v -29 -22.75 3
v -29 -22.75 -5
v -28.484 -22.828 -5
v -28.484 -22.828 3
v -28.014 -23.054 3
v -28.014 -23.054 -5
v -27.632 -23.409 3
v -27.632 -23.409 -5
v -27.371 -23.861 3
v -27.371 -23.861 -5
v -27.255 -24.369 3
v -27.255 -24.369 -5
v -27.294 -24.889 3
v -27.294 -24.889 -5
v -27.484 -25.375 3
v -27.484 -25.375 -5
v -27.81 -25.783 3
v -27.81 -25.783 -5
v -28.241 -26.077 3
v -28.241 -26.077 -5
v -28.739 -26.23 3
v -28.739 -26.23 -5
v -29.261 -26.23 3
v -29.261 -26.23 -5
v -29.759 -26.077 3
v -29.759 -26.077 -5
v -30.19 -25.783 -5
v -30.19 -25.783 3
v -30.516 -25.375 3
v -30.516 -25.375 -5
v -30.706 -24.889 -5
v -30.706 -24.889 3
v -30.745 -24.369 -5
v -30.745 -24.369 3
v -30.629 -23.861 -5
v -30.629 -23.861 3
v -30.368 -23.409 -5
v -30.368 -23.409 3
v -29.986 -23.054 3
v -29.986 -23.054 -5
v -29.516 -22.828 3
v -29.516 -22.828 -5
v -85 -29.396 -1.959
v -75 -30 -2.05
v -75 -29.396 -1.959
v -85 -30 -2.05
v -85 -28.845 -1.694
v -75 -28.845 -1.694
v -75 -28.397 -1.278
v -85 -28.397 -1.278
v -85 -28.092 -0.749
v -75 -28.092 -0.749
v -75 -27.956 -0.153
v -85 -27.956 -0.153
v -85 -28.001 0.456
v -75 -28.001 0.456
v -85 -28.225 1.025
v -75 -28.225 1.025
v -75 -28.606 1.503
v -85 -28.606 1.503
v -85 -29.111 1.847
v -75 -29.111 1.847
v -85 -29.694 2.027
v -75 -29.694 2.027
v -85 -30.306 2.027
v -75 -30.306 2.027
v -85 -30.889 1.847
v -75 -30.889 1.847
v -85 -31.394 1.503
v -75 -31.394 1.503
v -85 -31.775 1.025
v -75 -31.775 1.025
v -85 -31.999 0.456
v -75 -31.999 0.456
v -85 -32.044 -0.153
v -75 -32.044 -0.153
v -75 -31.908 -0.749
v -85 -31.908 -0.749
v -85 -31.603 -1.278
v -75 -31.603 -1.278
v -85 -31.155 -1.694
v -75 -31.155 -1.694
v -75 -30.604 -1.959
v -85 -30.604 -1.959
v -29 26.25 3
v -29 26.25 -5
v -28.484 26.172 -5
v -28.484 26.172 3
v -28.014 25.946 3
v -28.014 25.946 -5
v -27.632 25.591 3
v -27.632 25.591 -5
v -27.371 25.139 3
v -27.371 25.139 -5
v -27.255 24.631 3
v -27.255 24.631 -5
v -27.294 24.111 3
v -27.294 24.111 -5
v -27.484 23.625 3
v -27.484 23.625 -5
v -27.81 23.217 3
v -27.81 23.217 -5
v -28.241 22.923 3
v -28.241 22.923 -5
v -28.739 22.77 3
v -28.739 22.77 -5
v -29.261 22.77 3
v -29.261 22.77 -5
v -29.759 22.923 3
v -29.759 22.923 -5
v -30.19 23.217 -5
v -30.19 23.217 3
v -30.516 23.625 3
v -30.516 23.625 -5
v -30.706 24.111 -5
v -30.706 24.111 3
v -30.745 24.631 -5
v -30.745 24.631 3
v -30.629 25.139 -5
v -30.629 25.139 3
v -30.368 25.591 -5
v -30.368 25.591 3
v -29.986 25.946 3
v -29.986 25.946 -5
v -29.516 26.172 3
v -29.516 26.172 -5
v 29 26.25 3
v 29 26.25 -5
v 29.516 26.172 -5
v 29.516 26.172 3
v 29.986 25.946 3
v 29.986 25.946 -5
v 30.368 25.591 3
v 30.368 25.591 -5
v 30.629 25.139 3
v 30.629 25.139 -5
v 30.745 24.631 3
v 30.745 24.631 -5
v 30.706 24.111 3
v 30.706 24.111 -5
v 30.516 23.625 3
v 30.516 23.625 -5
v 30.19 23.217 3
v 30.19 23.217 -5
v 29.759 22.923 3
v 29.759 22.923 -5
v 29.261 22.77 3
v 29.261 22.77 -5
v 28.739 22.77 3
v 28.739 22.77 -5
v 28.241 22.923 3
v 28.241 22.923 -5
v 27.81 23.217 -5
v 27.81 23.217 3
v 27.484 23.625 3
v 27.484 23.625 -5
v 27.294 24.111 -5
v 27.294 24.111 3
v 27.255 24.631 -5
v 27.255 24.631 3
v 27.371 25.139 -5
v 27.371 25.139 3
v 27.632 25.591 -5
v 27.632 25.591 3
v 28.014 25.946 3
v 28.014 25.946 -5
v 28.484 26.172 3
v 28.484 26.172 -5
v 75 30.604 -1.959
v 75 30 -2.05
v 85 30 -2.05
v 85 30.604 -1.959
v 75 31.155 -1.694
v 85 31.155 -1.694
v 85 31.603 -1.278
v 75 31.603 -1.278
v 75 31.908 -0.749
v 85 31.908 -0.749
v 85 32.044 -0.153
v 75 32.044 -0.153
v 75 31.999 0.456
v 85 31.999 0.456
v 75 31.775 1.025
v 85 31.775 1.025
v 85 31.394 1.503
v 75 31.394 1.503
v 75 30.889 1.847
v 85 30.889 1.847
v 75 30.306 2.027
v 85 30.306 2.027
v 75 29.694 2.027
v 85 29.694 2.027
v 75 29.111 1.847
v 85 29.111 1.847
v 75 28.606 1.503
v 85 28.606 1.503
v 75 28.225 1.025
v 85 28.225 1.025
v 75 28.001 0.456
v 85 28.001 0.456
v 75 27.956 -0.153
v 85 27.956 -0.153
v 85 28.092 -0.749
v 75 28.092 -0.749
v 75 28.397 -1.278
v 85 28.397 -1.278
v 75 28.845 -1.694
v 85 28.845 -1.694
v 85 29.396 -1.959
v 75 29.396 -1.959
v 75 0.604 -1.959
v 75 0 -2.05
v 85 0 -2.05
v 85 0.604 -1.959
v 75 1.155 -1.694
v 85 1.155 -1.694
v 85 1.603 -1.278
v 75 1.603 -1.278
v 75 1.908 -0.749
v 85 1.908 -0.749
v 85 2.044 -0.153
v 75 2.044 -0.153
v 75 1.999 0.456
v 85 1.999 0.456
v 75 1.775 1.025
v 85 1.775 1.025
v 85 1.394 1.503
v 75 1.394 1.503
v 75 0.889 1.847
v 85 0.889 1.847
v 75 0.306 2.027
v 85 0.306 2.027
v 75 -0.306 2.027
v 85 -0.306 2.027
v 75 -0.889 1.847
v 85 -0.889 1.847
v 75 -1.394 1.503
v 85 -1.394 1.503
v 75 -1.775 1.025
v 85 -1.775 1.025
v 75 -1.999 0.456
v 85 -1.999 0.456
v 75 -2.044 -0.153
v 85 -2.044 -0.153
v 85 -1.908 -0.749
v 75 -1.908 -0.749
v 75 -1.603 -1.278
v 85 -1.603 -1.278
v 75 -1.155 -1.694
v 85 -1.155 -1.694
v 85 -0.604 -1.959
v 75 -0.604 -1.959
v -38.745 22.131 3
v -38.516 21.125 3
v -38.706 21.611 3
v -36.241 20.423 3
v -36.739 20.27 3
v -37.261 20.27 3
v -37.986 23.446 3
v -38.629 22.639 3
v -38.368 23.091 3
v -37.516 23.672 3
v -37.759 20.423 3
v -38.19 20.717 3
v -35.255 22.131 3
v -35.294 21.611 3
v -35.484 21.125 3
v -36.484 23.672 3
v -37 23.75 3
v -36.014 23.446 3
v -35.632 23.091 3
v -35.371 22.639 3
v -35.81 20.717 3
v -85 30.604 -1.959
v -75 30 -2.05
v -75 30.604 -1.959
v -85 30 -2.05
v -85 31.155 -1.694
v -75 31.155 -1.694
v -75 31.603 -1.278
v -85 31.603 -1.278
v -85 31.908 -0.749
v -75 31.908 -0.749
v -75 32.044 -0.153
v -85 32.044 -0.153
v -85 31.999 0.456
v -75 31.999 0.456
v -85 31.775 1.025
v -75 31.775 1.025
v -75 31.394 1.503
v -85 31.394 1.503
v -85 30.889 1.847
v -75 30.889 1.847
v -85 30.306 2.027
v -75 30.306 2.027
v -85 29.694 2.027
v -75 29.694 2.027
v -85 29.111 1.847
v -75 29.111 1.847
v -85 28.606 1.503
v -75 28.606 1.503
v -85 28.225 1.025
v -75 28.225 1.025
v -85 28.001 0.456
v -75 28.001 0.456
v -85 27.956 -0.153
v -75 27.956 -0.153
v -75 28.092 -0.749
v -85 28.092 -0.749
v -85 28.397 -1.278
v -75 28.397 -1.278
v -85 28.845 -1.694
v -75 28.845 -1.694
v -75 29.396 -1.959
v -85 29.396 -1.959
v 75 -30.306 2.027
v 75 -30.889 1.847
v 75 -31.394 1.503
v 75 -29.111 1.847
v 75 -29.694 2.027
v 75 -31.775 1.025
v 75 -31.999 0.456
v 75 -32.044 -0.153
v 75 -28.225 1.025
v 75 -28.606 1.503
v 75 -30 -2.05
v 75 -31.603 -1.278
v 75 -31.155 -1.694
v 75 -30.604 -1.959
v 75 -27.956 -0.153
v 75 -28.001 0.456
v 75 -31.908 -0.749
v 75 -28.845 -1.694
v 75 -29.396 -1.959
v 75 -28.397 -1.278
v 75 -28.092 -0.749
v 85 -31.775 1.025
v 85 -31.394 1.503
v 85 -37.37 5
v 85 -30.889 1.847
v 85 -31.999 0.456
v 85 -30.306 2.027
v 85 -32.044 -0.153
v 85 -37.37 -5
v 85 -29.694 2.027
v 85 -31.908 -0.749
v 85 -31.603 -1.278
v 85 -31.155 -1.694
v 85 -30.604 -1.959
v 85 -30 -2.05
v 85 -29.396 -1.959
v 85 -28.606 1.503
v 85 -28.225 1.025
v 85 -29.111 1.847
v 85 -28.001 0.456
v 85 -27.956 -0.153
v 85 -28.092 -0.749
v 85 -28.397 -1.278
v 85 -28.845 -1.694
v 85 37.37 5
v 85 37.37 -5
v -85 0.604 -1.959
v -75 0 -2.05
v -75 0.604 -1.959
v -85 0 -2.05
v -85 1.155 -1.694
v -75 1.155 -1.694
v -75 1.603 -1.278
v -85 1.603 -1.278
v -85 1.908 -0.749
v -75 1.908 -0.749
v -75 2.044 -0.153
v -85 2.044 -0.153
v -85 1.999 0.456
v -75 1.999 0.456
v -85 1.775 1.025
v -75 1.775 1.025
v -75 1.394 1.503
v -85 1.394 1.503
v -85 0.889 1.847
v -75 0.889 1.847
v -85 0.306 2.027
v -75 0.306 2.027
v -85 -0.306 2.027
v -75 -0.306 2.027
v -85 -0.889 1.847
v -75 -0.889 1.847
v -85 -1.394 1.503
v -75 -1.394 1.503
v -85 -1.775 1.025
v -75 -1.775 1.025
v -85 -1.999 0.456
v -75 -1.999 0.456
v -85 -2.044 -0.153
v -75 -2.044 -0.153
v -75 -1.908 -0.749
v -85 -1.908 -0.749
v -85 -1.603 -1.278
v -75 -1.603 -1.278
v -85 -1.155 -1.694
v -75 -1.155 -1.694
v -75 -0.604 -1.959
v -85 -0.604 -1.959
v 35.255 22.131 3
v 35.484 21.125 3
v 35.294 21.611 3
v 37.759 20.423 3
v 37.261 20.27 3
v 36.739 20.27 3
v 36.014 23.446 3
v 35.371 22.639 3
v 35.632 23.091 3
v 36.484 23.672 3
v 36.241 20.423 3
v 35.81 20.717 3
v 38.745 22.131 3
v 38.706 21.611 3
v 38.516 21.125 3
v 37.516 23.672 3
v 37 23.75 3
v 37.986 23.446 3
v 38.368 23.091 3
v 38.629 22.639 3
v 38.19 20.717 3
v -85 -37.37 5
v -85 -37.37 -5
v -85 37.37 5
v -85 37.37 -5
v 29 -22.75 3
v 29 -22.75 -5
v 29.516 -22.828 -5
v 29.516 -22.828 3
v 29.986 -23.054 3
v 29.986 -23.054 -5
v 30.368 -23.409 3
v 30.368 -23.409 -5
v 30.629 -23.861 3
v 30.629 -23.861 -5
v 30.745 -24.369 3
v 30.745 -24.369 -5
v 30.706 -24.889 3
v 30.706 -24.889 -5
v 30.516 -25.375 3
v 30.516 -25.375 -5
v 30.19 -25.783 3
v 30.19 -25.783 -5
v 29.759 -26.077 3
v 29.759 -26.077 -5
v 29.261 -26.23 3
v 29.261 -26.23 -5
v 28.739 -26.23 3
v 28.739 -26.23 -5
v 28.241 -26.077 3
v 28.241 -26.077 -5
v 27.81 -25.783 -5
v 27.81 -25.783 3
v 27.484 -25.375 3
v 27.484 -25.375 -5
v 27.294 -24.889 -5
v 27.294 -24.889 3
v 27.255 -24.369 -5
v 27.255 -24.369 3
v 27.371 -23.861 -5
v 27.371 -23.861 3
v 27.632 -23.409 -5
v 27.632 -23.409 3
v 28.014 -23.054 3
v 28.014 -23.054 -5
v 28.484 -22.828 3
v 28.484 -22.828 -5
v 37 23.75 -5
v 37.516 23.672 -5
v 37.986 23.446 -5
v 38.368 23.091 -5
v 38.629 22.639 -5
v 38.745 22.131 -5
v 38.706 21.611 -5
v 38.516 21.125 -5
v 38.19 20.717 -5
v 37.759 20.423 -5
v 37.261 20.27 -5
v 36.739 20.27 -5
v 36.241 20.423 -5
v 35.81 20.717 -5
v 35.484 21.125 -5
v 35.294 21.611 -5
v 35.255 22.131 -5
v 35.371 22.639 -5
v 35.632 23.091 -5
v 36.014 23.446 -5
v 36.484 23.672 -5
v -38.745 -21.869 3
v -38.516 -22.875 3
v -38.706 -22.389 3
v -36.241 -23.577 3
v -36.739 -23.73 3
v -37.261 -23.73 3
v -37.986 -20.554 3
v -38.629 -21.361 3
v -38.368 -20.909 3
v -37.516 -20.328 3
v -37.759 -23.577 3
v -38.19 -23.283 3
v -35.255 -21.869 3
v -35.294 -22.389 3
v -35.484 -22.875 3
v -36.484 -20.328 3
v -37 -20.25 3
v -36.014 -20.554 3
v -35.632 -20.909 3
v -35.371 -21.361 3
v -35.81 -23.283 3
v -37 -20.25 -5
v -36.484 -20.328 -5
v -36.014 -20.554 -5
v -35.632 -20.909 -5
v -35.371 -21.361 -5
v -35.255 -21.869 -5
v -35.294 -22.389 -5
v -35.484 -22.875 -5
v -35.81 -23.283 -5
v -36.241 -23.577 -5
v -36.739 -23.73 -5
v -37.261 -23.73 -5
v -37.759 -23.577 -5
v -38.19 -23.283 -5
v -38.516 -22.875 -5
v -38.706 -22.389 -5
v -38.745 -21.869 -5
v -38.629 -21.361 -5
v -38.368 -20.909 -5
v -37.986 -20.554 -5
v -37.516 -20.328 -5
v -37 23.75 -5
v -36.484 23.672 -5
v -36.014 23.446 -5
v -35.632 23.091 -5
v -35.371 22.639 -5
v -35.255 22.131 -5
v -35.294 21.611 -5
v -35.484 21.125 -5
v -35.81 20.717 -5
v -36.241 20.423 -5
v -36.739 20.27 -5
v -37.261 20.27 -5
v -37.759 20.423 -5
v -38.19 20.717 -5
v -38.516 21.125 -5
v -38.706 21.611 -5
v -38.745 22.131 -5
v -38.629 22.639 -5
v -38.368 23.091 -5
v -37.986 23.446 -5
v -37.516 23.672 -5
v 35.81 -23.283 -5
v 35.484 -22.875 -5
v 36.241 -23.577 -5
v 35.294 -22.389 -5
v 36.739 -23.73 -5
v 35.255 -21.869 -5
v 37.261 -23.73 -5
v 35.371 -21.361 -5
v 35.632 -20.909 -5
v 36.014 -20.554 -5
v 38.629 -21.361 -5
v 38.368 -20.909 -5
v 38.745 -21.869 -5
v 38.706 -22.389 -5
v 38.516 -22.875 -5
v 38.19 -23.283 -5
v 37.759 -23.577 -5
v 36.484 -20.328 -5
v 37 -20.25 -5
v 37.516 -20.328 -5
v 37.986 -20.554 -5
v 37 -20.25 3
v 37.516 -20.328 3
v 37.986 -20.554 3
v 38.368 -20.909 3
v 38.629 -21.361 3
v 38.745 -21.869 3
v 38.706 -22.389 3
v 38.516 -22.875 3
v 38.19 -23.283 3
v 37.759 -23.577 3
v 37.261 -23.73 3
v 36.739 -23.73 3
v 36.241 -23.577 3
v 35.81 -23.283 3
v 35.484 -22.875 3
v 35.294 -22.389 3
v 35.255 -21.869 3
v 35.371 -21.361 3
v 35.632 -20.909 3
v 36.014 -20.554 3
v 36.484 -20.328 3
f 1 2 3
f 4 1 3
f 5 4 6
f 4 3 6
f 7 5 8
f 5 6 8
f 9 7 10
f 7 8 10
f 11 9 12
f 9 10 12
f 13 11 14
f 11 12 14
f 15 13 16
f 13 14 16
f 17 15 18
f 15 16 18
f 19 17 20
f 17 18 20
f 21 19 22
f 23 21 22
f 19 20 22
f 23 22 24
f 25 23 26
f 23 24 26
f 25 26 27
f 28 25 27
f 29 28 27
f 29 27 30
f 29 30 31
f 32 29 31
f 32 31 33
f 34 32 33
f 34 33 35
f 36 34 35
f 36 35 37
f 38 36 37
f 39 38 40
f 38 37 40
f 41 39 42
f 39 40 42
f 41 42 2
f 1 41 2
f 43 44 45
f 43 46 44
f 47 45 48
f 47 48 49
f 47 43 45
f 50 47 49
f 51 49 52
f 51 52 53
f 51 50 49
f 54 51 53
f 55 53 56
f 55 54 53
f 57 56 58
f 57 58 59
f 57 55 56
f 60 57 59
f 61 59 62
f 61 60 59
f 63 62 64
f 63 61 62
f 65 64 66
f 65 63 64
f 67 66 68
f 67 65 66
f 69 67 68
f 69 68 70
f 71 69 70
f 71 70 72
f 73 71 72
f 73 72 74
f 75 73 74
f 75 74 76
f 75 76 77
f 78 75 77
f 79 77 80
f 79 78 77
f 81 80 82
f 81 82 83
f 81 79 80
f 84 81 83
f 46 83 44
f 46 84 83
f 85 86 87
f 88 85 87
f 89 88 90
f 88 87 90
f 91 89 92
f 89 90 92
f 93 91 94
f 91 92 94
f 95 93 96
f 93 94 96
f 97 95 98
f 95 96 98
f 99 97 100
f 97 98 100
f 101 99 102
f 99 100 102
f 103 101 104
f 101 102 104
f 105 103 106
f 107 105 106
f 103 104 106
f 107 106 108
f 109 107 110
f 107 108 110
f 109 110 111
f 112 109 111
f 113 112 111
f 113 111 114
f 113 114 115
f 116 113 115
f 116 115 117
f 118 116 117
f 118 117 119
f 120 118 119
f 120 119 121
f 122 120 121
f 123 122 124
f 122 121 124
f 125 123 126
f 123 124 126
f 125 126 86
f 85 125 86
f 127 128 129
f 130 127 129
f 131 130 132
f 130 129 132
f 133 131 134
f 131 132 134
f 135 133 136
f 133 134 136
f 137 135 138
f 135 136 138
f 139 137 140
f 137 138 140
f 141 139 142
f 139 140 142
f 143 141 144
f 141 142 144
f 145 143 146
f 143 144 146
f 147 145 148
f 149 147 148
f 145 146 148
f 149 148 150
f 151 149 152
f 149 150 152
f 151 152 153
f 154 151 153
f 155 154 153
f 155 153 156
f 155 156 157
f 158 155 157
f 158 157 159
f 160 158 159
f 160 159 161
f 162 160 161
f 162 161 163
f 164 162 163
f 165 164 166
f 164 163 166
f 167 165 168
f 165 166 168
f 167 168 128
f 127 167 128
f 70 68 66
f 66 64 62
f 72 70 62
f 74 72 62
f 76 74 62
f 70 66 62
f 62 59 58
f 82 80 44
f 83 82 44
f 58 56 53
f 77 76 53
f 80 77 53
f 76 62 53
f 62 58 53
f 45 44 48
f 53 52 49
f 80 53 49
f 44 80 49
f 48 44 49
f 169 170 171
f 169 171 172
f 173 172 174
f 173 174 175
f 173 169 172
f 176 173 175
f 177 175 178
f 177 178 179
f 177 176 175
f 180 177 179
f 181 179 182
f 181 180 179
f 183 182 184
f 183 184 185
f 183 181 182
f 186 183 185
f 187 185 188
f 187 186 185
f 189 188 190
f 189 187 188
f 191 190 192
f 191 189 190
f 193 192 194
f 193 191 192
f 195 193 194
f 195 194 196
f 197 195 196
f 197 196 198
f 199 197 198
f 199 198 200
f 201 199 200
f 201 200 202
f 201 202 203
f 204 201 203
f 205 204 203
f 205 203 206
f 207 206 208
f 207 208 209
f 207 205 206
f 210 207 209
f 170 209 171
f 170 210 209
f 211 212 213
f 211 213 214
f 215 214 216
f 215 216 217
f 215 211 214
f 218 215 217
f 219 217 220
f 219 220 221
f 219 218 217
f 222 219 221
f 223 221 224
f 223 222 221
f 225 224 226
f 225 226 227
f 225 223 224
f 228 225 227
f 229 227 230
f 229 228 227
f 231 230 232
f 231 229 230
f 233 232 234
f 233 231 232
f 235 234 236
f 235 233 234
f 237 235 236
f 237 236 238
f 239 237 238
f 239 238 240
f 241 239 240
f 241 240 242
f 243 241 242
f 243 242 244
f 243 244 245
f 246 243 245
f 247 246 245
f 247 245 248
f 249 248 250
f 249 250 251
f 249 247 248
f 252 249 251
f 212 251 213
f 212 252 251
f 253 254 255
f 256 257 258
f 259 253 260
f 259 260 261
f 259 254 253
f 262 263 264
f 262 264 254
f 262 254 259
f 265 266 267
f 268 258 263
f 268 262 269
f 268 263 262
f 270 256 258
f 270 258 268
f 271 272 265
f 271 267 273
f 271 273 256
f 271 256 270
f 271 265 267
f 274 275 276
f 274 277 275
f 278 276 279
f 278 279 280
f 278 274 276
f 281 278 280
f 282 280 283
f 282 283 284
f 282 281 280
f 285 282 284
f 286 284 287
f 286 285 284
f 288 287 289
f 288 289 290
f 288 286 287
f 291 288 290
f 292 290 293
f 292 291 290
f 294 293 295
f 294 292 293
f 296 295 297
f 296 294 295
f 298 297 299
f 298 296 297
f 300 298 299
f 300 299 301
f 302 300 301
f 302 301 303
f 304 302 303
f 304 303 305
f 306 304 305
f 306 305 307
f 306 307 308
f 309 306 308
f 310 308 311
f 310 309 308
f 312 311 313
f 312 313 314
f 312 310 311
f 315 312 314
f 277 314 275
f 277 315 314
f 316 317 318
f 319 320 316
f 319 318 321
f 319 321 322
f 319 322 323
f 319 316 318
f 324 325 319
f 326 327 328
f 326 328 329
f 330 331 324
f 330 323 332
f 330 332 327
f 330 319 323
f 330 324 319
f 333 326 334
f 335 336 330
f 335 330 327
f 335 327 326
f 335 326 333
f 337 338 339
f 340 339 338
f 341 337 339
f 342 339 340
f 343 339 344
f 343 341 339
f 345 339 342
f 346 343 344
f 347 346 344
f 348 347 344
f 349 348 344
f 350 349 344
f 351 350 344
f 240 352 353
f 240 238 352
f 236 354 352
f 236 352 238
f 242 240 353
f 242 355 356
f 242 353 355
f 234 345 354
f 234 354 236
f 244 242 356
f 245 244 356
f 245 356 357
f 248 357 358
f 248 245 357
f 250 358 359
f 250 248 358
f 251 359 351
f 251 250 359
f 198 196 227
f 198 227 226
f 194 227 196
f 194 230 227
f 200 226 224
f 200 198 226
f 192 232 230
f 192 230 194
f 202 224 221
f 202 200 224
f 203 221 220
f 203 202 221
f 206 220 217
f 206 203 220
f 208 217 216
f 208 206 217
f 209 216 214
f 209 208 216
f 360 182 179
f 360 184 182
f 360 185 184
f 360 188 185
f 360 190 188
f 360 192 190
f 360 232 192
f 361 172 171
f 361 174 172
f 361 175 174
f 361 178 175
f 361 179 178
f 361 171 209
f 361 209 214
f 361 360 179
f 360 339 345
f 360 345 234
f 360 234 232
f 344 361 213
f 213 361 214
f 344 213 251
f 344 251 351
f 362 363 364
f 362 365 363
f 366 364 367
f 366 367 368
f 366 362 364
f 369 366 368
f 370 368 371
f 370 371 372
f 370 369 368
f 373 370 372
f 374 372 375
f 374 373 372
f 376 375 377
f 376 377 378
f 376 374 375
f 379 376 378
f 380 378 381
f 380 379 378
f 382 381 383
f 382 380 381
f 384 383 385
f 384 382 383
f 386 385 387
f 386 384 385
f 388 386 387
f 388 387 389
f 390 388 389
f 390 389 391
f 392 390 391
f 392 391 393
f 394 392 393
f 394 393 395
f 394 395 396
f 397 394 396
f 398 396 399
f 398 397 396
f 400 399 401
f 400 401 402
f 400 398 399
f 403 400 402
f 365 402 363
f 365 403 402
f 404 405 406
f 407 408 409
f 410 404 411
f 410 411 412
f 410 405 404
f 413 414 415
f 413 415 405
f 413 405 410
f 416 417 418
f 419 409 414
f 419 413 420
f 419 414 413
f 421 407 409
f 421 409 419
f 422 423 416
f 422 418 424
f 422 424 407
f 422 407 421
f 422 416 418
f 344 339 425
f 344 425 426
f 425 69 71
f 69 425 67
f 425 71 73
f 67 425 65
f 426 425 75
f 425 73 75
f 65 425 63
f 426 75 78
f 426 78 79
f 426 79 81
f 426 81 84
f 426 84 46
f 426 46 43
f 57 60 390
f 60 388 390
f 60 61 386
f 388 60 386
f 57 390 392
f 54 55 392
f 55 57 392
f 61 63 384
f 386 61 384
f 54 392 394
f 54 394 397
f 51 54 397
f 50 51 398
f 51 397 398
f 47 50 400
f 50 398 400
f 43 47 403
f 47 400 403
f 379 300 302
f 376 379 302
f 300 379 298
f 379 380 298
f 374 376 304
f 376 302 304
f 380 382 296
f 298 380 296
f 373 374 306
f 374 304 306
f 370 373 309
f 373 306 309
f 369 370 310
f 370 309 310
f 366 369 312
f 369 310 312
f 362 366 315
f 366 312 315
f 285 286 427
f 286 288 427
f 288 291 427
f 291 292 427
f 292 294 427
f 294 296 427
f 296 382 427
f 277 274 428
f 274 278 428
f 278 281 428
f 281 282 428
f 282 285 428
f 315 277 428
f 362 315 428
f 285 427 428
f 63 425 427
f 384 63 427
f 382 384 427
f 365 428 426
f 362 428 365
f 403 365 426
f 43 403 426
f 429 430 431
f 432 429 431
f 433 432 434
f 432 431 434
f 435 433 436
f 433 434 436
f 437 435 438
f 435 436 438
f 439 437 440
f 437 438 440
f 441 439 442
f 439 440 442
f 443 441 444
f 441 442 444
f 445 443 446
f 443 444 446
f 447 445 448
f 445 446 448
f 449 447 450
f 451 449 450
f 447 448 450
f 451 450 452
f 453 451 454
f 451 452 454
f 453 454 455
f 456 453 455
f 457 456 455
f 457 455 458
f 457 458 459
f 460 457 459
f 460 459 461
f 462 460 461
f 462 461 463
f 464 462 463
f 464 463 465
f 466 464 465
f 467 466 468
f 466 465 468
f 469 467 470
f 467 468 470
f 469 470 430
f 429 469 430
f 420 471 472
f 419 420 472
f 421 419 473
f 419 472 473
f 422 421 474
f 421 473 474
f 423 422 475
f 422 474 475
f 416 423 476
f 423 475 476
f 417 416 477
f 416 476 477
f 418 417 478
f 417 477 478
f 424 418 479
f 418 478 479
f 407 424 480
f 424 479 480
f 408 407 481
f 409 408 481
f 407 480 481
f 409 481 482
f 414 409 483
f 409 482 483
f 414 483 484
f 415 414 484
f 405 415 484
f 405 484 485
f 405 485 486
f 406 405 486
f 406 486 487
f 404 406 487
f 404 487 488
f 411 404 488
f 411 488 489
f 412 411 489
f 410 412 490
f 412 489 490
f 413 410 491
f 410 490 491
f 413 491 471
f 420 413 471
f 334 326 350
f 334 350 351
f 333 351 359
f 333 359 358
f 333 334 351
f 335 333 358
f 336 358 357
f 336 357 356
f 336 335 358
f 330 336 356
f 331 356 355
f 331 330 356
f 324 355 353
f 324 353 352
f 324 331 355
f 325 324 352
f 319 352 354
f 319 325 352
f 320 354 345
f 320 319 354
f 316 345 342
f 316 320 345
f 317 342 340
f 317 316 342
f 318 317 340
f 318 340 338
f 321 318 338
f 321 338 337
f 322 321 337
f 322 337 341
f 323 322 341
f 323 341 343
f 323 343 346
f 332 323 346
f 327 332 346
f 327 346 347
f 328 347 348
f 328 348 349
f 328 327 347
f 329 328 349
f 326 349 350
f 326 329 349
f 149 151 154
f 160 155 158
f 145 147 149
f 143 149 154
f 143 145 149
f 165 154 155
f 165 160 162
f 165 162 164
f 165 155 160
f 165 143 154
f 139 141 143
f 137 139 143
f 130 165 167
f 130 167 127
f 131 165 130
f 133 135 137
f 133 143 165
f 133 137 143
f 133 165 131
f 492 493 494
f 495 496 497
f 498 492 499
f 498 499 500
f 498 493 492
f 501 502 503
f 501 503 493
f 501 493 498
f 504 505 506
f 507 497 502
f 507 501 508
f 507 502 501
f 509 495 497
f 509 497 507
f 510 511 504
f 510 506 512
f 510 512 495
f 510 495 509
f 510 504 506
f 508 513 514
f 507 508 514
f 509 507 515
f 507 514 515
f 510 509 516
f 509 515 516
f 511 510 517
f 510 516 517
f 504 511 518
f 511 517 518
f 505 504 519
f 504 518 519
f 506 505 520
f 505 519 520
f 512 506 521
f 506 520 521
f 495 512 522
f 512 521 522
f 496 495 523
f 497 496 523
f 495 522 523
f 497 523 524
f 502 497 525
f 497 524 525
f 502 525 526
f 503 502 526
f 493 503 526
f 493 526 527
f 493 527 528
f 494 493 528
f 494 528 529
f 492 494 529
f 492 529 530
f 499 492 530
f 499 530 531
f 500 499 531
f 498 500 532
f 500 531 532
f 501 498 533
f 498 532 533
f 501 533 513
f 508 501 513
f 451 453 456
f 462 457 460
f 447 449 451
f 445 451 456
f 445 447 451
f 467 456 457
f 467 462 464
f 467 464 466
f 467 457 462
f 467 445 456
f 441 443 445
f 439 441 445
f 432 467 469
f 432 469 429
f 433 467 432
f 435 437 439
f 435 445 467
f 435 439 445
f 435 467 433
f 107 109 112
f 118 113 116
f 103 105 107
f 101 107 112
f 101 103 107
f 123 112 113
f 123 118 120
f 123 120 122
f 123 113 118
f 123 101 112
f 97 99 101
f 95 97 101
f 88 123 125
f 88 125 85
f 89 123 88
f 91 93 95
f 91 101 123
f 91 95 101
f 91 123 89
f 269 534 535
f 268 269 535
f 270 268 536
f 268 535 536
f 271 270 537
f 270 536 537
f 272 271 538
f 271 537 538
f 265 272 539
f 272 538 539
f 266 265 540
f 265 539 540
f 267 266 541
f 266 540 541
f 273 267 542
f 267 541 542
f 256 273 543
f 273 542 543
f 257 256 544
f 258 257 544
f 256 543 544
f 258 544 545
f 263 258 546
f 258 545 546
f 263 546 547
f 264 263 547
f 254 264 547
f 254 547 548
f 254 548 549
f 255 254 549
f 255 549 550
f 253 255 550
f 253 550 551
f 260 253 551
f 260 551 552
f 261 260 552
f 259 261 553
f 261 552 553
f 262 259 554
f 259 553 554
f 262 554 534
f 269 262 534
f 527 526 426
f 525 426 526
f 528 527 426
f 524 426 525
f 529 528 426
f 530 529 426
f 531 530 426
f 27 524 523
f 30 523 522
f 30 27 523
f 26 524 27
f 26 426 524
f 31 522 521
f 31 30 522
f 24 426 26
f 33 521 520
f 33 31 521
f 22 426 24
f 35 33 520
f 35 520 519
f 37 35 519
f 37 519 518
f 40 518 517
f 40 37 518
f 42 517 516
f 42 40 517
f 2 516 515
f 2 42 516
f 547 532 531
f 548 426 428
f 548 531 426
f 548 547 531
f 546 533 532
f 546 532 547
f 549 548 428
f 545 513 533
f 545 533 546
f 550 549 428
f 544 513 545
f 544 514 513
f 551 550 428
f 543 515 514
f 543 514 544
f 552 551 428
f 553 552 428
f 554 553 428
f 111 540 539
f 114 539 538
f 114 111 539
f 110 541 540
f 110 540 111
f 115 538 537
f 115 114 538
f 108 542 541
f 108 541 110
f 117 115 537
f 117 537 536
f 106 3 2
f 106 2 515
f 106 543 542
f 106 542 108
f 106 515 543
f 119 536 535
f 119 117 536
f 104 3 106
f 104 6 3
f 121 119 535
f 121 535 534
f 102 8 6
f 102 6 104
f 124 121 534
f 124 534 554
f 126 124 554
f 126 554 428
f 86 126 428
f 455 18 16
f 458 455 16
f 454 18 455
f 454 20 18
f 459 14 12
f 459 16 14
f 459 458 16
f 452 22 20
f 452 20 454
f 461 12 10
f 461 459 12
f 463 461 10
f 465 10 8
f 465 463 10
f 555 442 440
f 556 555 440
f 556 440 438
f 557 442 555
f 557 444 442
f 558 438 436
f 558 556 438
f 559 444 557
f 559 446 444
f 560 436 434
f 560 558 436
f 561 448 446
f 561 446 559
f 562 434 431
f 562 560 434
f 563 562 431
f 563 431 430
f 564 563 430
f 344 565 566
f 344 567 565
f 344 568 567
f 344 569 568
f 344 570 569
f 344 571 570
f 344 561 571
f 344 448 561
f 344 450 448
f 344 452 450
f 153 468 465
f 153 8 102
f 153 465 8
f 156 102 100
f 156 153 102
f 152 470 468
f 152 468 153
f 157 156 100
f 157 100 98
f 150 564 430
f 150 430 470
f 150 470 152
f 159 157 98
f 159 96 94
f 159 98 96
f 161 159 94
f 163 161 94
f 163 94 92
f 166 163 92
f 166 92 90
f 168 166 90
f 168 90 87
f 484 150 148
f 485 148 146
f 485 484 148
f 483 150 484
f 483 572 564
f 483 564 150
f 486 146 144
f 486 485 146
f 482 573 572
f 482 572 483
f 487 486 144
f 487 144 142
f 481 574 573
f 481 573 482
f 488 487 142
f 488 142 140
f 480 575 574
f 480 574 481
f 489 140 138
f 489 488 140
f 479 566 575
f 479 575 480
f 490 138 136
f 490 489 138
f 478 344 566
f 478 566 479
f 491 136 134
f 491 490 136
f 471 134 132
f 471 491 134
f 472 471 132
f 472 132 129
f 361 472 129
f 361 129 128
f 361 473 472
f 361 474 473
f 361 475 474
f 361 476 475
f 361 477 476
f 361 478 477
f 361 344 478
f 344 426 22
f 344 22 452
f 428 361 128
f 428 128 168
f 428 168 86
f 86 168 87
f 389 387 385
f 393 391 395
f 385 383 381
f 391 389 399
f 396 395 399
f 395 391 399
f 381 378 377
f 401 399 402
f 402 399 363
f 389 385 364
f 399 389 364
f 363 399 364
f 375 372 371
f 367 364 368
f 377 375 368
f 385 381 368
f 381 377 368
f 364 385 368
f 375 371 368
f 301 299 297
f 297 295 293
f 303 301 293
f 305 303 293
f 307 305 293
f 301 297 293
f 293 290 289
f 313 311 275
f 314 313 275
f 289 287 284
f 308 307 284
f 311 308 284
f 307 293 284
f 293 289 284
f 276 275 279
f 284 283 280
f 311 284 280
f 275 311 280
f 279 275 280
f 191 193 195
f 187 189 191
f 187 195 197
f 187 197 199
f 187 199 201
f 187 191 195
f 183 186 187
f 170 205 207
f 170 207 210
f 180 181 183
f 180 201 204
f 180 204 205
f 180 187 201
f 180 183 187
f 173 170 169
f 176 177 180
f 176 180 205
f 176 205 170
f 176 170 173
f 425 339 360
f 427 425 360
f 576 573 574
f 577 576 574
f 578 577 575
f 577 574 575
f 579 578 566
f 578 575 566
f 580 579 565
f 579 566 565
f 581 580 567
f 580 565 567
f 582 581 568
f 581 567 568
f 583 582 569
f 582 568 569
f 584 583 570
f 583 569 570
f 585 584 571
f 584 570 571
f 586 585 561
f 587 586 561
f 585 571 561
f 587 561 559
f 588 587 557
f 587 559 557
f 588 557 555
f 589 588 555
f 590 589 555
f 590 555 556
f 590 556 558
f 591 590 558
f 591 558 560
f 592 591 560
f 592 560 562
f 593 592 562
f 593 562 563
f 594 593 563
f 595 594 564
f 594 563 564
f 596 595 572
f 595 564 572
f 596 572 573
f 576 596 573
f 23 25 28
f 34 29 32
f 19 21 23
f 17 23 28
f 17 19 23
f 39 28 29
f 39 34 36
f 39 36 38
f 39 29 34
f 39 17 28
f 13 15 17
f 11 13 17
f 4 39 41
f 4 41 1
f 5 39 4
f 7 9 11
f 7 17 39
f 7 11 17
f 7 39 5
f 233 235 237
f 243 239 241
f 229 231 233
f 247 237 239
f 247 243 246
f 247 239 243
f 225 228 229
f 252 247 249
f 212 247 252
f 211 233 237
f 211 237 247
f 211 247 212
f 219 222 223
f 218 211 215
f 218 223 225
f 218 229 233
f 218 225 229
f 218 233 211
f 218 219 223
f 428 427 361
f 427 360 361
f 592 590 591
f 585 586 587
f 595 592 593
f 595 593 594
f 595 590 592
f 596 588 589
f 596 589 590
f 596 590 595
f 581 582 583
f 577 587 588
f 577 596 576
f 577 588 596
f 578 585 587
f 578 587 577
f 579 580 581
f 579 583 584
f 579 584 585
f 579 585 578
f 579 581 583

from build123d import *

# Parameters (mm, degrees)
SKETCH1_W           = 10
SKETCH1_H           = 74.74
SKETCH1_R           = 2.05
BOSS_EXTRUDE1_DEPTH = 85
SKETCH1_2_R         = 2.05
BOSS_EXTRUDE2_DEPTH = 75
SKETCH2_R           = 1.75
CUT_EXTRUDE1_DEPTH  = 8
SKETCH3_R           = 1.75
CUT_EXTRUDE2_DEPTH  = 8


with BuildPart() as part:
    # Sketch1 → Boss-Extrude1 (new, symmetric)
    with BuildSketch(Plane(origin=(0, 0, 0), x_dir=(0, 0, -1), z_dir=(1, 0, 0))):
        Rectangle(SKETCH1_W, SKETCH1_H)
        with Locations((0, 30)):
            Circle(SKETCH1_R, mode=Mode.SUBTRACT)
        with Locations((0, -30)):
            Circle(SKETCH1_R, mode=Mode.SUBTRACT)
        Circle(SKETCH1_R, mode=Mode.SUBTRACT)
    extrude(amount=BOSS_EXTRUDE1_DEPTH, both=True)

    # Sketch1<2> → Boss-Extrude2 (add, symmetric)
    with BuildSketch(Plane(origin=(0, 0, 0), x_dir=(0, 0, -1), z_dir=(1, 0, 0))):
        with Locations((0, 30)):
            Circle(SKETCH1_2_R)
        with Locations((0, -30)):
            Circle(SKETCH1_2_R)
        Circle(SKETCH1_2_R)
    extrude(amount=BOSS_EXTRUDE2_DEPTH, both=True)

    # Sketch2 → Cut-Extrude1 (cut)
    with BuildSketch(Plane(origin=(0, 0, -5), x_dir=(-1, 0, 0), z_dir=(0, 0, -1))):
        with Locations((-37, 22)):
            Circle(SKETCH2_R)
        with Locations((37, 22)):
            Circle(SKETCH2_R)
        with Locations((37, -22)):
            Circle(SKETCH2_R)
        with Locations((-37, -22)):
            Circle(SKETCH2_R)
    extrude(amount=-CUT_EXTRUDE1_DEPTH, mode=Mode.SUBTRACT)

    # Sketch3 → Cut-Extrude2 (cut)
    with BuildSketch(Plane(origin=(0, 0, -5), x_dir=(-1, 0, 0), z_dir=(0, 0, -1))):
        with Locations((-29, 24.5)):
            Circle(SKETCH3_R)
        with Locations((29, 24.5)):
            Circle(SKETCH3_R)
        with Locations((29, -24.5)):
            Circle(SKETCH3_R)
        with Locations((-29, -24.5)):
            Circle(SKETCH3_R)
    extrude(amount=-CUT_EXTRUDE2_DEPTH, mode=Mode.SUBTRACT)


solid = part.part
